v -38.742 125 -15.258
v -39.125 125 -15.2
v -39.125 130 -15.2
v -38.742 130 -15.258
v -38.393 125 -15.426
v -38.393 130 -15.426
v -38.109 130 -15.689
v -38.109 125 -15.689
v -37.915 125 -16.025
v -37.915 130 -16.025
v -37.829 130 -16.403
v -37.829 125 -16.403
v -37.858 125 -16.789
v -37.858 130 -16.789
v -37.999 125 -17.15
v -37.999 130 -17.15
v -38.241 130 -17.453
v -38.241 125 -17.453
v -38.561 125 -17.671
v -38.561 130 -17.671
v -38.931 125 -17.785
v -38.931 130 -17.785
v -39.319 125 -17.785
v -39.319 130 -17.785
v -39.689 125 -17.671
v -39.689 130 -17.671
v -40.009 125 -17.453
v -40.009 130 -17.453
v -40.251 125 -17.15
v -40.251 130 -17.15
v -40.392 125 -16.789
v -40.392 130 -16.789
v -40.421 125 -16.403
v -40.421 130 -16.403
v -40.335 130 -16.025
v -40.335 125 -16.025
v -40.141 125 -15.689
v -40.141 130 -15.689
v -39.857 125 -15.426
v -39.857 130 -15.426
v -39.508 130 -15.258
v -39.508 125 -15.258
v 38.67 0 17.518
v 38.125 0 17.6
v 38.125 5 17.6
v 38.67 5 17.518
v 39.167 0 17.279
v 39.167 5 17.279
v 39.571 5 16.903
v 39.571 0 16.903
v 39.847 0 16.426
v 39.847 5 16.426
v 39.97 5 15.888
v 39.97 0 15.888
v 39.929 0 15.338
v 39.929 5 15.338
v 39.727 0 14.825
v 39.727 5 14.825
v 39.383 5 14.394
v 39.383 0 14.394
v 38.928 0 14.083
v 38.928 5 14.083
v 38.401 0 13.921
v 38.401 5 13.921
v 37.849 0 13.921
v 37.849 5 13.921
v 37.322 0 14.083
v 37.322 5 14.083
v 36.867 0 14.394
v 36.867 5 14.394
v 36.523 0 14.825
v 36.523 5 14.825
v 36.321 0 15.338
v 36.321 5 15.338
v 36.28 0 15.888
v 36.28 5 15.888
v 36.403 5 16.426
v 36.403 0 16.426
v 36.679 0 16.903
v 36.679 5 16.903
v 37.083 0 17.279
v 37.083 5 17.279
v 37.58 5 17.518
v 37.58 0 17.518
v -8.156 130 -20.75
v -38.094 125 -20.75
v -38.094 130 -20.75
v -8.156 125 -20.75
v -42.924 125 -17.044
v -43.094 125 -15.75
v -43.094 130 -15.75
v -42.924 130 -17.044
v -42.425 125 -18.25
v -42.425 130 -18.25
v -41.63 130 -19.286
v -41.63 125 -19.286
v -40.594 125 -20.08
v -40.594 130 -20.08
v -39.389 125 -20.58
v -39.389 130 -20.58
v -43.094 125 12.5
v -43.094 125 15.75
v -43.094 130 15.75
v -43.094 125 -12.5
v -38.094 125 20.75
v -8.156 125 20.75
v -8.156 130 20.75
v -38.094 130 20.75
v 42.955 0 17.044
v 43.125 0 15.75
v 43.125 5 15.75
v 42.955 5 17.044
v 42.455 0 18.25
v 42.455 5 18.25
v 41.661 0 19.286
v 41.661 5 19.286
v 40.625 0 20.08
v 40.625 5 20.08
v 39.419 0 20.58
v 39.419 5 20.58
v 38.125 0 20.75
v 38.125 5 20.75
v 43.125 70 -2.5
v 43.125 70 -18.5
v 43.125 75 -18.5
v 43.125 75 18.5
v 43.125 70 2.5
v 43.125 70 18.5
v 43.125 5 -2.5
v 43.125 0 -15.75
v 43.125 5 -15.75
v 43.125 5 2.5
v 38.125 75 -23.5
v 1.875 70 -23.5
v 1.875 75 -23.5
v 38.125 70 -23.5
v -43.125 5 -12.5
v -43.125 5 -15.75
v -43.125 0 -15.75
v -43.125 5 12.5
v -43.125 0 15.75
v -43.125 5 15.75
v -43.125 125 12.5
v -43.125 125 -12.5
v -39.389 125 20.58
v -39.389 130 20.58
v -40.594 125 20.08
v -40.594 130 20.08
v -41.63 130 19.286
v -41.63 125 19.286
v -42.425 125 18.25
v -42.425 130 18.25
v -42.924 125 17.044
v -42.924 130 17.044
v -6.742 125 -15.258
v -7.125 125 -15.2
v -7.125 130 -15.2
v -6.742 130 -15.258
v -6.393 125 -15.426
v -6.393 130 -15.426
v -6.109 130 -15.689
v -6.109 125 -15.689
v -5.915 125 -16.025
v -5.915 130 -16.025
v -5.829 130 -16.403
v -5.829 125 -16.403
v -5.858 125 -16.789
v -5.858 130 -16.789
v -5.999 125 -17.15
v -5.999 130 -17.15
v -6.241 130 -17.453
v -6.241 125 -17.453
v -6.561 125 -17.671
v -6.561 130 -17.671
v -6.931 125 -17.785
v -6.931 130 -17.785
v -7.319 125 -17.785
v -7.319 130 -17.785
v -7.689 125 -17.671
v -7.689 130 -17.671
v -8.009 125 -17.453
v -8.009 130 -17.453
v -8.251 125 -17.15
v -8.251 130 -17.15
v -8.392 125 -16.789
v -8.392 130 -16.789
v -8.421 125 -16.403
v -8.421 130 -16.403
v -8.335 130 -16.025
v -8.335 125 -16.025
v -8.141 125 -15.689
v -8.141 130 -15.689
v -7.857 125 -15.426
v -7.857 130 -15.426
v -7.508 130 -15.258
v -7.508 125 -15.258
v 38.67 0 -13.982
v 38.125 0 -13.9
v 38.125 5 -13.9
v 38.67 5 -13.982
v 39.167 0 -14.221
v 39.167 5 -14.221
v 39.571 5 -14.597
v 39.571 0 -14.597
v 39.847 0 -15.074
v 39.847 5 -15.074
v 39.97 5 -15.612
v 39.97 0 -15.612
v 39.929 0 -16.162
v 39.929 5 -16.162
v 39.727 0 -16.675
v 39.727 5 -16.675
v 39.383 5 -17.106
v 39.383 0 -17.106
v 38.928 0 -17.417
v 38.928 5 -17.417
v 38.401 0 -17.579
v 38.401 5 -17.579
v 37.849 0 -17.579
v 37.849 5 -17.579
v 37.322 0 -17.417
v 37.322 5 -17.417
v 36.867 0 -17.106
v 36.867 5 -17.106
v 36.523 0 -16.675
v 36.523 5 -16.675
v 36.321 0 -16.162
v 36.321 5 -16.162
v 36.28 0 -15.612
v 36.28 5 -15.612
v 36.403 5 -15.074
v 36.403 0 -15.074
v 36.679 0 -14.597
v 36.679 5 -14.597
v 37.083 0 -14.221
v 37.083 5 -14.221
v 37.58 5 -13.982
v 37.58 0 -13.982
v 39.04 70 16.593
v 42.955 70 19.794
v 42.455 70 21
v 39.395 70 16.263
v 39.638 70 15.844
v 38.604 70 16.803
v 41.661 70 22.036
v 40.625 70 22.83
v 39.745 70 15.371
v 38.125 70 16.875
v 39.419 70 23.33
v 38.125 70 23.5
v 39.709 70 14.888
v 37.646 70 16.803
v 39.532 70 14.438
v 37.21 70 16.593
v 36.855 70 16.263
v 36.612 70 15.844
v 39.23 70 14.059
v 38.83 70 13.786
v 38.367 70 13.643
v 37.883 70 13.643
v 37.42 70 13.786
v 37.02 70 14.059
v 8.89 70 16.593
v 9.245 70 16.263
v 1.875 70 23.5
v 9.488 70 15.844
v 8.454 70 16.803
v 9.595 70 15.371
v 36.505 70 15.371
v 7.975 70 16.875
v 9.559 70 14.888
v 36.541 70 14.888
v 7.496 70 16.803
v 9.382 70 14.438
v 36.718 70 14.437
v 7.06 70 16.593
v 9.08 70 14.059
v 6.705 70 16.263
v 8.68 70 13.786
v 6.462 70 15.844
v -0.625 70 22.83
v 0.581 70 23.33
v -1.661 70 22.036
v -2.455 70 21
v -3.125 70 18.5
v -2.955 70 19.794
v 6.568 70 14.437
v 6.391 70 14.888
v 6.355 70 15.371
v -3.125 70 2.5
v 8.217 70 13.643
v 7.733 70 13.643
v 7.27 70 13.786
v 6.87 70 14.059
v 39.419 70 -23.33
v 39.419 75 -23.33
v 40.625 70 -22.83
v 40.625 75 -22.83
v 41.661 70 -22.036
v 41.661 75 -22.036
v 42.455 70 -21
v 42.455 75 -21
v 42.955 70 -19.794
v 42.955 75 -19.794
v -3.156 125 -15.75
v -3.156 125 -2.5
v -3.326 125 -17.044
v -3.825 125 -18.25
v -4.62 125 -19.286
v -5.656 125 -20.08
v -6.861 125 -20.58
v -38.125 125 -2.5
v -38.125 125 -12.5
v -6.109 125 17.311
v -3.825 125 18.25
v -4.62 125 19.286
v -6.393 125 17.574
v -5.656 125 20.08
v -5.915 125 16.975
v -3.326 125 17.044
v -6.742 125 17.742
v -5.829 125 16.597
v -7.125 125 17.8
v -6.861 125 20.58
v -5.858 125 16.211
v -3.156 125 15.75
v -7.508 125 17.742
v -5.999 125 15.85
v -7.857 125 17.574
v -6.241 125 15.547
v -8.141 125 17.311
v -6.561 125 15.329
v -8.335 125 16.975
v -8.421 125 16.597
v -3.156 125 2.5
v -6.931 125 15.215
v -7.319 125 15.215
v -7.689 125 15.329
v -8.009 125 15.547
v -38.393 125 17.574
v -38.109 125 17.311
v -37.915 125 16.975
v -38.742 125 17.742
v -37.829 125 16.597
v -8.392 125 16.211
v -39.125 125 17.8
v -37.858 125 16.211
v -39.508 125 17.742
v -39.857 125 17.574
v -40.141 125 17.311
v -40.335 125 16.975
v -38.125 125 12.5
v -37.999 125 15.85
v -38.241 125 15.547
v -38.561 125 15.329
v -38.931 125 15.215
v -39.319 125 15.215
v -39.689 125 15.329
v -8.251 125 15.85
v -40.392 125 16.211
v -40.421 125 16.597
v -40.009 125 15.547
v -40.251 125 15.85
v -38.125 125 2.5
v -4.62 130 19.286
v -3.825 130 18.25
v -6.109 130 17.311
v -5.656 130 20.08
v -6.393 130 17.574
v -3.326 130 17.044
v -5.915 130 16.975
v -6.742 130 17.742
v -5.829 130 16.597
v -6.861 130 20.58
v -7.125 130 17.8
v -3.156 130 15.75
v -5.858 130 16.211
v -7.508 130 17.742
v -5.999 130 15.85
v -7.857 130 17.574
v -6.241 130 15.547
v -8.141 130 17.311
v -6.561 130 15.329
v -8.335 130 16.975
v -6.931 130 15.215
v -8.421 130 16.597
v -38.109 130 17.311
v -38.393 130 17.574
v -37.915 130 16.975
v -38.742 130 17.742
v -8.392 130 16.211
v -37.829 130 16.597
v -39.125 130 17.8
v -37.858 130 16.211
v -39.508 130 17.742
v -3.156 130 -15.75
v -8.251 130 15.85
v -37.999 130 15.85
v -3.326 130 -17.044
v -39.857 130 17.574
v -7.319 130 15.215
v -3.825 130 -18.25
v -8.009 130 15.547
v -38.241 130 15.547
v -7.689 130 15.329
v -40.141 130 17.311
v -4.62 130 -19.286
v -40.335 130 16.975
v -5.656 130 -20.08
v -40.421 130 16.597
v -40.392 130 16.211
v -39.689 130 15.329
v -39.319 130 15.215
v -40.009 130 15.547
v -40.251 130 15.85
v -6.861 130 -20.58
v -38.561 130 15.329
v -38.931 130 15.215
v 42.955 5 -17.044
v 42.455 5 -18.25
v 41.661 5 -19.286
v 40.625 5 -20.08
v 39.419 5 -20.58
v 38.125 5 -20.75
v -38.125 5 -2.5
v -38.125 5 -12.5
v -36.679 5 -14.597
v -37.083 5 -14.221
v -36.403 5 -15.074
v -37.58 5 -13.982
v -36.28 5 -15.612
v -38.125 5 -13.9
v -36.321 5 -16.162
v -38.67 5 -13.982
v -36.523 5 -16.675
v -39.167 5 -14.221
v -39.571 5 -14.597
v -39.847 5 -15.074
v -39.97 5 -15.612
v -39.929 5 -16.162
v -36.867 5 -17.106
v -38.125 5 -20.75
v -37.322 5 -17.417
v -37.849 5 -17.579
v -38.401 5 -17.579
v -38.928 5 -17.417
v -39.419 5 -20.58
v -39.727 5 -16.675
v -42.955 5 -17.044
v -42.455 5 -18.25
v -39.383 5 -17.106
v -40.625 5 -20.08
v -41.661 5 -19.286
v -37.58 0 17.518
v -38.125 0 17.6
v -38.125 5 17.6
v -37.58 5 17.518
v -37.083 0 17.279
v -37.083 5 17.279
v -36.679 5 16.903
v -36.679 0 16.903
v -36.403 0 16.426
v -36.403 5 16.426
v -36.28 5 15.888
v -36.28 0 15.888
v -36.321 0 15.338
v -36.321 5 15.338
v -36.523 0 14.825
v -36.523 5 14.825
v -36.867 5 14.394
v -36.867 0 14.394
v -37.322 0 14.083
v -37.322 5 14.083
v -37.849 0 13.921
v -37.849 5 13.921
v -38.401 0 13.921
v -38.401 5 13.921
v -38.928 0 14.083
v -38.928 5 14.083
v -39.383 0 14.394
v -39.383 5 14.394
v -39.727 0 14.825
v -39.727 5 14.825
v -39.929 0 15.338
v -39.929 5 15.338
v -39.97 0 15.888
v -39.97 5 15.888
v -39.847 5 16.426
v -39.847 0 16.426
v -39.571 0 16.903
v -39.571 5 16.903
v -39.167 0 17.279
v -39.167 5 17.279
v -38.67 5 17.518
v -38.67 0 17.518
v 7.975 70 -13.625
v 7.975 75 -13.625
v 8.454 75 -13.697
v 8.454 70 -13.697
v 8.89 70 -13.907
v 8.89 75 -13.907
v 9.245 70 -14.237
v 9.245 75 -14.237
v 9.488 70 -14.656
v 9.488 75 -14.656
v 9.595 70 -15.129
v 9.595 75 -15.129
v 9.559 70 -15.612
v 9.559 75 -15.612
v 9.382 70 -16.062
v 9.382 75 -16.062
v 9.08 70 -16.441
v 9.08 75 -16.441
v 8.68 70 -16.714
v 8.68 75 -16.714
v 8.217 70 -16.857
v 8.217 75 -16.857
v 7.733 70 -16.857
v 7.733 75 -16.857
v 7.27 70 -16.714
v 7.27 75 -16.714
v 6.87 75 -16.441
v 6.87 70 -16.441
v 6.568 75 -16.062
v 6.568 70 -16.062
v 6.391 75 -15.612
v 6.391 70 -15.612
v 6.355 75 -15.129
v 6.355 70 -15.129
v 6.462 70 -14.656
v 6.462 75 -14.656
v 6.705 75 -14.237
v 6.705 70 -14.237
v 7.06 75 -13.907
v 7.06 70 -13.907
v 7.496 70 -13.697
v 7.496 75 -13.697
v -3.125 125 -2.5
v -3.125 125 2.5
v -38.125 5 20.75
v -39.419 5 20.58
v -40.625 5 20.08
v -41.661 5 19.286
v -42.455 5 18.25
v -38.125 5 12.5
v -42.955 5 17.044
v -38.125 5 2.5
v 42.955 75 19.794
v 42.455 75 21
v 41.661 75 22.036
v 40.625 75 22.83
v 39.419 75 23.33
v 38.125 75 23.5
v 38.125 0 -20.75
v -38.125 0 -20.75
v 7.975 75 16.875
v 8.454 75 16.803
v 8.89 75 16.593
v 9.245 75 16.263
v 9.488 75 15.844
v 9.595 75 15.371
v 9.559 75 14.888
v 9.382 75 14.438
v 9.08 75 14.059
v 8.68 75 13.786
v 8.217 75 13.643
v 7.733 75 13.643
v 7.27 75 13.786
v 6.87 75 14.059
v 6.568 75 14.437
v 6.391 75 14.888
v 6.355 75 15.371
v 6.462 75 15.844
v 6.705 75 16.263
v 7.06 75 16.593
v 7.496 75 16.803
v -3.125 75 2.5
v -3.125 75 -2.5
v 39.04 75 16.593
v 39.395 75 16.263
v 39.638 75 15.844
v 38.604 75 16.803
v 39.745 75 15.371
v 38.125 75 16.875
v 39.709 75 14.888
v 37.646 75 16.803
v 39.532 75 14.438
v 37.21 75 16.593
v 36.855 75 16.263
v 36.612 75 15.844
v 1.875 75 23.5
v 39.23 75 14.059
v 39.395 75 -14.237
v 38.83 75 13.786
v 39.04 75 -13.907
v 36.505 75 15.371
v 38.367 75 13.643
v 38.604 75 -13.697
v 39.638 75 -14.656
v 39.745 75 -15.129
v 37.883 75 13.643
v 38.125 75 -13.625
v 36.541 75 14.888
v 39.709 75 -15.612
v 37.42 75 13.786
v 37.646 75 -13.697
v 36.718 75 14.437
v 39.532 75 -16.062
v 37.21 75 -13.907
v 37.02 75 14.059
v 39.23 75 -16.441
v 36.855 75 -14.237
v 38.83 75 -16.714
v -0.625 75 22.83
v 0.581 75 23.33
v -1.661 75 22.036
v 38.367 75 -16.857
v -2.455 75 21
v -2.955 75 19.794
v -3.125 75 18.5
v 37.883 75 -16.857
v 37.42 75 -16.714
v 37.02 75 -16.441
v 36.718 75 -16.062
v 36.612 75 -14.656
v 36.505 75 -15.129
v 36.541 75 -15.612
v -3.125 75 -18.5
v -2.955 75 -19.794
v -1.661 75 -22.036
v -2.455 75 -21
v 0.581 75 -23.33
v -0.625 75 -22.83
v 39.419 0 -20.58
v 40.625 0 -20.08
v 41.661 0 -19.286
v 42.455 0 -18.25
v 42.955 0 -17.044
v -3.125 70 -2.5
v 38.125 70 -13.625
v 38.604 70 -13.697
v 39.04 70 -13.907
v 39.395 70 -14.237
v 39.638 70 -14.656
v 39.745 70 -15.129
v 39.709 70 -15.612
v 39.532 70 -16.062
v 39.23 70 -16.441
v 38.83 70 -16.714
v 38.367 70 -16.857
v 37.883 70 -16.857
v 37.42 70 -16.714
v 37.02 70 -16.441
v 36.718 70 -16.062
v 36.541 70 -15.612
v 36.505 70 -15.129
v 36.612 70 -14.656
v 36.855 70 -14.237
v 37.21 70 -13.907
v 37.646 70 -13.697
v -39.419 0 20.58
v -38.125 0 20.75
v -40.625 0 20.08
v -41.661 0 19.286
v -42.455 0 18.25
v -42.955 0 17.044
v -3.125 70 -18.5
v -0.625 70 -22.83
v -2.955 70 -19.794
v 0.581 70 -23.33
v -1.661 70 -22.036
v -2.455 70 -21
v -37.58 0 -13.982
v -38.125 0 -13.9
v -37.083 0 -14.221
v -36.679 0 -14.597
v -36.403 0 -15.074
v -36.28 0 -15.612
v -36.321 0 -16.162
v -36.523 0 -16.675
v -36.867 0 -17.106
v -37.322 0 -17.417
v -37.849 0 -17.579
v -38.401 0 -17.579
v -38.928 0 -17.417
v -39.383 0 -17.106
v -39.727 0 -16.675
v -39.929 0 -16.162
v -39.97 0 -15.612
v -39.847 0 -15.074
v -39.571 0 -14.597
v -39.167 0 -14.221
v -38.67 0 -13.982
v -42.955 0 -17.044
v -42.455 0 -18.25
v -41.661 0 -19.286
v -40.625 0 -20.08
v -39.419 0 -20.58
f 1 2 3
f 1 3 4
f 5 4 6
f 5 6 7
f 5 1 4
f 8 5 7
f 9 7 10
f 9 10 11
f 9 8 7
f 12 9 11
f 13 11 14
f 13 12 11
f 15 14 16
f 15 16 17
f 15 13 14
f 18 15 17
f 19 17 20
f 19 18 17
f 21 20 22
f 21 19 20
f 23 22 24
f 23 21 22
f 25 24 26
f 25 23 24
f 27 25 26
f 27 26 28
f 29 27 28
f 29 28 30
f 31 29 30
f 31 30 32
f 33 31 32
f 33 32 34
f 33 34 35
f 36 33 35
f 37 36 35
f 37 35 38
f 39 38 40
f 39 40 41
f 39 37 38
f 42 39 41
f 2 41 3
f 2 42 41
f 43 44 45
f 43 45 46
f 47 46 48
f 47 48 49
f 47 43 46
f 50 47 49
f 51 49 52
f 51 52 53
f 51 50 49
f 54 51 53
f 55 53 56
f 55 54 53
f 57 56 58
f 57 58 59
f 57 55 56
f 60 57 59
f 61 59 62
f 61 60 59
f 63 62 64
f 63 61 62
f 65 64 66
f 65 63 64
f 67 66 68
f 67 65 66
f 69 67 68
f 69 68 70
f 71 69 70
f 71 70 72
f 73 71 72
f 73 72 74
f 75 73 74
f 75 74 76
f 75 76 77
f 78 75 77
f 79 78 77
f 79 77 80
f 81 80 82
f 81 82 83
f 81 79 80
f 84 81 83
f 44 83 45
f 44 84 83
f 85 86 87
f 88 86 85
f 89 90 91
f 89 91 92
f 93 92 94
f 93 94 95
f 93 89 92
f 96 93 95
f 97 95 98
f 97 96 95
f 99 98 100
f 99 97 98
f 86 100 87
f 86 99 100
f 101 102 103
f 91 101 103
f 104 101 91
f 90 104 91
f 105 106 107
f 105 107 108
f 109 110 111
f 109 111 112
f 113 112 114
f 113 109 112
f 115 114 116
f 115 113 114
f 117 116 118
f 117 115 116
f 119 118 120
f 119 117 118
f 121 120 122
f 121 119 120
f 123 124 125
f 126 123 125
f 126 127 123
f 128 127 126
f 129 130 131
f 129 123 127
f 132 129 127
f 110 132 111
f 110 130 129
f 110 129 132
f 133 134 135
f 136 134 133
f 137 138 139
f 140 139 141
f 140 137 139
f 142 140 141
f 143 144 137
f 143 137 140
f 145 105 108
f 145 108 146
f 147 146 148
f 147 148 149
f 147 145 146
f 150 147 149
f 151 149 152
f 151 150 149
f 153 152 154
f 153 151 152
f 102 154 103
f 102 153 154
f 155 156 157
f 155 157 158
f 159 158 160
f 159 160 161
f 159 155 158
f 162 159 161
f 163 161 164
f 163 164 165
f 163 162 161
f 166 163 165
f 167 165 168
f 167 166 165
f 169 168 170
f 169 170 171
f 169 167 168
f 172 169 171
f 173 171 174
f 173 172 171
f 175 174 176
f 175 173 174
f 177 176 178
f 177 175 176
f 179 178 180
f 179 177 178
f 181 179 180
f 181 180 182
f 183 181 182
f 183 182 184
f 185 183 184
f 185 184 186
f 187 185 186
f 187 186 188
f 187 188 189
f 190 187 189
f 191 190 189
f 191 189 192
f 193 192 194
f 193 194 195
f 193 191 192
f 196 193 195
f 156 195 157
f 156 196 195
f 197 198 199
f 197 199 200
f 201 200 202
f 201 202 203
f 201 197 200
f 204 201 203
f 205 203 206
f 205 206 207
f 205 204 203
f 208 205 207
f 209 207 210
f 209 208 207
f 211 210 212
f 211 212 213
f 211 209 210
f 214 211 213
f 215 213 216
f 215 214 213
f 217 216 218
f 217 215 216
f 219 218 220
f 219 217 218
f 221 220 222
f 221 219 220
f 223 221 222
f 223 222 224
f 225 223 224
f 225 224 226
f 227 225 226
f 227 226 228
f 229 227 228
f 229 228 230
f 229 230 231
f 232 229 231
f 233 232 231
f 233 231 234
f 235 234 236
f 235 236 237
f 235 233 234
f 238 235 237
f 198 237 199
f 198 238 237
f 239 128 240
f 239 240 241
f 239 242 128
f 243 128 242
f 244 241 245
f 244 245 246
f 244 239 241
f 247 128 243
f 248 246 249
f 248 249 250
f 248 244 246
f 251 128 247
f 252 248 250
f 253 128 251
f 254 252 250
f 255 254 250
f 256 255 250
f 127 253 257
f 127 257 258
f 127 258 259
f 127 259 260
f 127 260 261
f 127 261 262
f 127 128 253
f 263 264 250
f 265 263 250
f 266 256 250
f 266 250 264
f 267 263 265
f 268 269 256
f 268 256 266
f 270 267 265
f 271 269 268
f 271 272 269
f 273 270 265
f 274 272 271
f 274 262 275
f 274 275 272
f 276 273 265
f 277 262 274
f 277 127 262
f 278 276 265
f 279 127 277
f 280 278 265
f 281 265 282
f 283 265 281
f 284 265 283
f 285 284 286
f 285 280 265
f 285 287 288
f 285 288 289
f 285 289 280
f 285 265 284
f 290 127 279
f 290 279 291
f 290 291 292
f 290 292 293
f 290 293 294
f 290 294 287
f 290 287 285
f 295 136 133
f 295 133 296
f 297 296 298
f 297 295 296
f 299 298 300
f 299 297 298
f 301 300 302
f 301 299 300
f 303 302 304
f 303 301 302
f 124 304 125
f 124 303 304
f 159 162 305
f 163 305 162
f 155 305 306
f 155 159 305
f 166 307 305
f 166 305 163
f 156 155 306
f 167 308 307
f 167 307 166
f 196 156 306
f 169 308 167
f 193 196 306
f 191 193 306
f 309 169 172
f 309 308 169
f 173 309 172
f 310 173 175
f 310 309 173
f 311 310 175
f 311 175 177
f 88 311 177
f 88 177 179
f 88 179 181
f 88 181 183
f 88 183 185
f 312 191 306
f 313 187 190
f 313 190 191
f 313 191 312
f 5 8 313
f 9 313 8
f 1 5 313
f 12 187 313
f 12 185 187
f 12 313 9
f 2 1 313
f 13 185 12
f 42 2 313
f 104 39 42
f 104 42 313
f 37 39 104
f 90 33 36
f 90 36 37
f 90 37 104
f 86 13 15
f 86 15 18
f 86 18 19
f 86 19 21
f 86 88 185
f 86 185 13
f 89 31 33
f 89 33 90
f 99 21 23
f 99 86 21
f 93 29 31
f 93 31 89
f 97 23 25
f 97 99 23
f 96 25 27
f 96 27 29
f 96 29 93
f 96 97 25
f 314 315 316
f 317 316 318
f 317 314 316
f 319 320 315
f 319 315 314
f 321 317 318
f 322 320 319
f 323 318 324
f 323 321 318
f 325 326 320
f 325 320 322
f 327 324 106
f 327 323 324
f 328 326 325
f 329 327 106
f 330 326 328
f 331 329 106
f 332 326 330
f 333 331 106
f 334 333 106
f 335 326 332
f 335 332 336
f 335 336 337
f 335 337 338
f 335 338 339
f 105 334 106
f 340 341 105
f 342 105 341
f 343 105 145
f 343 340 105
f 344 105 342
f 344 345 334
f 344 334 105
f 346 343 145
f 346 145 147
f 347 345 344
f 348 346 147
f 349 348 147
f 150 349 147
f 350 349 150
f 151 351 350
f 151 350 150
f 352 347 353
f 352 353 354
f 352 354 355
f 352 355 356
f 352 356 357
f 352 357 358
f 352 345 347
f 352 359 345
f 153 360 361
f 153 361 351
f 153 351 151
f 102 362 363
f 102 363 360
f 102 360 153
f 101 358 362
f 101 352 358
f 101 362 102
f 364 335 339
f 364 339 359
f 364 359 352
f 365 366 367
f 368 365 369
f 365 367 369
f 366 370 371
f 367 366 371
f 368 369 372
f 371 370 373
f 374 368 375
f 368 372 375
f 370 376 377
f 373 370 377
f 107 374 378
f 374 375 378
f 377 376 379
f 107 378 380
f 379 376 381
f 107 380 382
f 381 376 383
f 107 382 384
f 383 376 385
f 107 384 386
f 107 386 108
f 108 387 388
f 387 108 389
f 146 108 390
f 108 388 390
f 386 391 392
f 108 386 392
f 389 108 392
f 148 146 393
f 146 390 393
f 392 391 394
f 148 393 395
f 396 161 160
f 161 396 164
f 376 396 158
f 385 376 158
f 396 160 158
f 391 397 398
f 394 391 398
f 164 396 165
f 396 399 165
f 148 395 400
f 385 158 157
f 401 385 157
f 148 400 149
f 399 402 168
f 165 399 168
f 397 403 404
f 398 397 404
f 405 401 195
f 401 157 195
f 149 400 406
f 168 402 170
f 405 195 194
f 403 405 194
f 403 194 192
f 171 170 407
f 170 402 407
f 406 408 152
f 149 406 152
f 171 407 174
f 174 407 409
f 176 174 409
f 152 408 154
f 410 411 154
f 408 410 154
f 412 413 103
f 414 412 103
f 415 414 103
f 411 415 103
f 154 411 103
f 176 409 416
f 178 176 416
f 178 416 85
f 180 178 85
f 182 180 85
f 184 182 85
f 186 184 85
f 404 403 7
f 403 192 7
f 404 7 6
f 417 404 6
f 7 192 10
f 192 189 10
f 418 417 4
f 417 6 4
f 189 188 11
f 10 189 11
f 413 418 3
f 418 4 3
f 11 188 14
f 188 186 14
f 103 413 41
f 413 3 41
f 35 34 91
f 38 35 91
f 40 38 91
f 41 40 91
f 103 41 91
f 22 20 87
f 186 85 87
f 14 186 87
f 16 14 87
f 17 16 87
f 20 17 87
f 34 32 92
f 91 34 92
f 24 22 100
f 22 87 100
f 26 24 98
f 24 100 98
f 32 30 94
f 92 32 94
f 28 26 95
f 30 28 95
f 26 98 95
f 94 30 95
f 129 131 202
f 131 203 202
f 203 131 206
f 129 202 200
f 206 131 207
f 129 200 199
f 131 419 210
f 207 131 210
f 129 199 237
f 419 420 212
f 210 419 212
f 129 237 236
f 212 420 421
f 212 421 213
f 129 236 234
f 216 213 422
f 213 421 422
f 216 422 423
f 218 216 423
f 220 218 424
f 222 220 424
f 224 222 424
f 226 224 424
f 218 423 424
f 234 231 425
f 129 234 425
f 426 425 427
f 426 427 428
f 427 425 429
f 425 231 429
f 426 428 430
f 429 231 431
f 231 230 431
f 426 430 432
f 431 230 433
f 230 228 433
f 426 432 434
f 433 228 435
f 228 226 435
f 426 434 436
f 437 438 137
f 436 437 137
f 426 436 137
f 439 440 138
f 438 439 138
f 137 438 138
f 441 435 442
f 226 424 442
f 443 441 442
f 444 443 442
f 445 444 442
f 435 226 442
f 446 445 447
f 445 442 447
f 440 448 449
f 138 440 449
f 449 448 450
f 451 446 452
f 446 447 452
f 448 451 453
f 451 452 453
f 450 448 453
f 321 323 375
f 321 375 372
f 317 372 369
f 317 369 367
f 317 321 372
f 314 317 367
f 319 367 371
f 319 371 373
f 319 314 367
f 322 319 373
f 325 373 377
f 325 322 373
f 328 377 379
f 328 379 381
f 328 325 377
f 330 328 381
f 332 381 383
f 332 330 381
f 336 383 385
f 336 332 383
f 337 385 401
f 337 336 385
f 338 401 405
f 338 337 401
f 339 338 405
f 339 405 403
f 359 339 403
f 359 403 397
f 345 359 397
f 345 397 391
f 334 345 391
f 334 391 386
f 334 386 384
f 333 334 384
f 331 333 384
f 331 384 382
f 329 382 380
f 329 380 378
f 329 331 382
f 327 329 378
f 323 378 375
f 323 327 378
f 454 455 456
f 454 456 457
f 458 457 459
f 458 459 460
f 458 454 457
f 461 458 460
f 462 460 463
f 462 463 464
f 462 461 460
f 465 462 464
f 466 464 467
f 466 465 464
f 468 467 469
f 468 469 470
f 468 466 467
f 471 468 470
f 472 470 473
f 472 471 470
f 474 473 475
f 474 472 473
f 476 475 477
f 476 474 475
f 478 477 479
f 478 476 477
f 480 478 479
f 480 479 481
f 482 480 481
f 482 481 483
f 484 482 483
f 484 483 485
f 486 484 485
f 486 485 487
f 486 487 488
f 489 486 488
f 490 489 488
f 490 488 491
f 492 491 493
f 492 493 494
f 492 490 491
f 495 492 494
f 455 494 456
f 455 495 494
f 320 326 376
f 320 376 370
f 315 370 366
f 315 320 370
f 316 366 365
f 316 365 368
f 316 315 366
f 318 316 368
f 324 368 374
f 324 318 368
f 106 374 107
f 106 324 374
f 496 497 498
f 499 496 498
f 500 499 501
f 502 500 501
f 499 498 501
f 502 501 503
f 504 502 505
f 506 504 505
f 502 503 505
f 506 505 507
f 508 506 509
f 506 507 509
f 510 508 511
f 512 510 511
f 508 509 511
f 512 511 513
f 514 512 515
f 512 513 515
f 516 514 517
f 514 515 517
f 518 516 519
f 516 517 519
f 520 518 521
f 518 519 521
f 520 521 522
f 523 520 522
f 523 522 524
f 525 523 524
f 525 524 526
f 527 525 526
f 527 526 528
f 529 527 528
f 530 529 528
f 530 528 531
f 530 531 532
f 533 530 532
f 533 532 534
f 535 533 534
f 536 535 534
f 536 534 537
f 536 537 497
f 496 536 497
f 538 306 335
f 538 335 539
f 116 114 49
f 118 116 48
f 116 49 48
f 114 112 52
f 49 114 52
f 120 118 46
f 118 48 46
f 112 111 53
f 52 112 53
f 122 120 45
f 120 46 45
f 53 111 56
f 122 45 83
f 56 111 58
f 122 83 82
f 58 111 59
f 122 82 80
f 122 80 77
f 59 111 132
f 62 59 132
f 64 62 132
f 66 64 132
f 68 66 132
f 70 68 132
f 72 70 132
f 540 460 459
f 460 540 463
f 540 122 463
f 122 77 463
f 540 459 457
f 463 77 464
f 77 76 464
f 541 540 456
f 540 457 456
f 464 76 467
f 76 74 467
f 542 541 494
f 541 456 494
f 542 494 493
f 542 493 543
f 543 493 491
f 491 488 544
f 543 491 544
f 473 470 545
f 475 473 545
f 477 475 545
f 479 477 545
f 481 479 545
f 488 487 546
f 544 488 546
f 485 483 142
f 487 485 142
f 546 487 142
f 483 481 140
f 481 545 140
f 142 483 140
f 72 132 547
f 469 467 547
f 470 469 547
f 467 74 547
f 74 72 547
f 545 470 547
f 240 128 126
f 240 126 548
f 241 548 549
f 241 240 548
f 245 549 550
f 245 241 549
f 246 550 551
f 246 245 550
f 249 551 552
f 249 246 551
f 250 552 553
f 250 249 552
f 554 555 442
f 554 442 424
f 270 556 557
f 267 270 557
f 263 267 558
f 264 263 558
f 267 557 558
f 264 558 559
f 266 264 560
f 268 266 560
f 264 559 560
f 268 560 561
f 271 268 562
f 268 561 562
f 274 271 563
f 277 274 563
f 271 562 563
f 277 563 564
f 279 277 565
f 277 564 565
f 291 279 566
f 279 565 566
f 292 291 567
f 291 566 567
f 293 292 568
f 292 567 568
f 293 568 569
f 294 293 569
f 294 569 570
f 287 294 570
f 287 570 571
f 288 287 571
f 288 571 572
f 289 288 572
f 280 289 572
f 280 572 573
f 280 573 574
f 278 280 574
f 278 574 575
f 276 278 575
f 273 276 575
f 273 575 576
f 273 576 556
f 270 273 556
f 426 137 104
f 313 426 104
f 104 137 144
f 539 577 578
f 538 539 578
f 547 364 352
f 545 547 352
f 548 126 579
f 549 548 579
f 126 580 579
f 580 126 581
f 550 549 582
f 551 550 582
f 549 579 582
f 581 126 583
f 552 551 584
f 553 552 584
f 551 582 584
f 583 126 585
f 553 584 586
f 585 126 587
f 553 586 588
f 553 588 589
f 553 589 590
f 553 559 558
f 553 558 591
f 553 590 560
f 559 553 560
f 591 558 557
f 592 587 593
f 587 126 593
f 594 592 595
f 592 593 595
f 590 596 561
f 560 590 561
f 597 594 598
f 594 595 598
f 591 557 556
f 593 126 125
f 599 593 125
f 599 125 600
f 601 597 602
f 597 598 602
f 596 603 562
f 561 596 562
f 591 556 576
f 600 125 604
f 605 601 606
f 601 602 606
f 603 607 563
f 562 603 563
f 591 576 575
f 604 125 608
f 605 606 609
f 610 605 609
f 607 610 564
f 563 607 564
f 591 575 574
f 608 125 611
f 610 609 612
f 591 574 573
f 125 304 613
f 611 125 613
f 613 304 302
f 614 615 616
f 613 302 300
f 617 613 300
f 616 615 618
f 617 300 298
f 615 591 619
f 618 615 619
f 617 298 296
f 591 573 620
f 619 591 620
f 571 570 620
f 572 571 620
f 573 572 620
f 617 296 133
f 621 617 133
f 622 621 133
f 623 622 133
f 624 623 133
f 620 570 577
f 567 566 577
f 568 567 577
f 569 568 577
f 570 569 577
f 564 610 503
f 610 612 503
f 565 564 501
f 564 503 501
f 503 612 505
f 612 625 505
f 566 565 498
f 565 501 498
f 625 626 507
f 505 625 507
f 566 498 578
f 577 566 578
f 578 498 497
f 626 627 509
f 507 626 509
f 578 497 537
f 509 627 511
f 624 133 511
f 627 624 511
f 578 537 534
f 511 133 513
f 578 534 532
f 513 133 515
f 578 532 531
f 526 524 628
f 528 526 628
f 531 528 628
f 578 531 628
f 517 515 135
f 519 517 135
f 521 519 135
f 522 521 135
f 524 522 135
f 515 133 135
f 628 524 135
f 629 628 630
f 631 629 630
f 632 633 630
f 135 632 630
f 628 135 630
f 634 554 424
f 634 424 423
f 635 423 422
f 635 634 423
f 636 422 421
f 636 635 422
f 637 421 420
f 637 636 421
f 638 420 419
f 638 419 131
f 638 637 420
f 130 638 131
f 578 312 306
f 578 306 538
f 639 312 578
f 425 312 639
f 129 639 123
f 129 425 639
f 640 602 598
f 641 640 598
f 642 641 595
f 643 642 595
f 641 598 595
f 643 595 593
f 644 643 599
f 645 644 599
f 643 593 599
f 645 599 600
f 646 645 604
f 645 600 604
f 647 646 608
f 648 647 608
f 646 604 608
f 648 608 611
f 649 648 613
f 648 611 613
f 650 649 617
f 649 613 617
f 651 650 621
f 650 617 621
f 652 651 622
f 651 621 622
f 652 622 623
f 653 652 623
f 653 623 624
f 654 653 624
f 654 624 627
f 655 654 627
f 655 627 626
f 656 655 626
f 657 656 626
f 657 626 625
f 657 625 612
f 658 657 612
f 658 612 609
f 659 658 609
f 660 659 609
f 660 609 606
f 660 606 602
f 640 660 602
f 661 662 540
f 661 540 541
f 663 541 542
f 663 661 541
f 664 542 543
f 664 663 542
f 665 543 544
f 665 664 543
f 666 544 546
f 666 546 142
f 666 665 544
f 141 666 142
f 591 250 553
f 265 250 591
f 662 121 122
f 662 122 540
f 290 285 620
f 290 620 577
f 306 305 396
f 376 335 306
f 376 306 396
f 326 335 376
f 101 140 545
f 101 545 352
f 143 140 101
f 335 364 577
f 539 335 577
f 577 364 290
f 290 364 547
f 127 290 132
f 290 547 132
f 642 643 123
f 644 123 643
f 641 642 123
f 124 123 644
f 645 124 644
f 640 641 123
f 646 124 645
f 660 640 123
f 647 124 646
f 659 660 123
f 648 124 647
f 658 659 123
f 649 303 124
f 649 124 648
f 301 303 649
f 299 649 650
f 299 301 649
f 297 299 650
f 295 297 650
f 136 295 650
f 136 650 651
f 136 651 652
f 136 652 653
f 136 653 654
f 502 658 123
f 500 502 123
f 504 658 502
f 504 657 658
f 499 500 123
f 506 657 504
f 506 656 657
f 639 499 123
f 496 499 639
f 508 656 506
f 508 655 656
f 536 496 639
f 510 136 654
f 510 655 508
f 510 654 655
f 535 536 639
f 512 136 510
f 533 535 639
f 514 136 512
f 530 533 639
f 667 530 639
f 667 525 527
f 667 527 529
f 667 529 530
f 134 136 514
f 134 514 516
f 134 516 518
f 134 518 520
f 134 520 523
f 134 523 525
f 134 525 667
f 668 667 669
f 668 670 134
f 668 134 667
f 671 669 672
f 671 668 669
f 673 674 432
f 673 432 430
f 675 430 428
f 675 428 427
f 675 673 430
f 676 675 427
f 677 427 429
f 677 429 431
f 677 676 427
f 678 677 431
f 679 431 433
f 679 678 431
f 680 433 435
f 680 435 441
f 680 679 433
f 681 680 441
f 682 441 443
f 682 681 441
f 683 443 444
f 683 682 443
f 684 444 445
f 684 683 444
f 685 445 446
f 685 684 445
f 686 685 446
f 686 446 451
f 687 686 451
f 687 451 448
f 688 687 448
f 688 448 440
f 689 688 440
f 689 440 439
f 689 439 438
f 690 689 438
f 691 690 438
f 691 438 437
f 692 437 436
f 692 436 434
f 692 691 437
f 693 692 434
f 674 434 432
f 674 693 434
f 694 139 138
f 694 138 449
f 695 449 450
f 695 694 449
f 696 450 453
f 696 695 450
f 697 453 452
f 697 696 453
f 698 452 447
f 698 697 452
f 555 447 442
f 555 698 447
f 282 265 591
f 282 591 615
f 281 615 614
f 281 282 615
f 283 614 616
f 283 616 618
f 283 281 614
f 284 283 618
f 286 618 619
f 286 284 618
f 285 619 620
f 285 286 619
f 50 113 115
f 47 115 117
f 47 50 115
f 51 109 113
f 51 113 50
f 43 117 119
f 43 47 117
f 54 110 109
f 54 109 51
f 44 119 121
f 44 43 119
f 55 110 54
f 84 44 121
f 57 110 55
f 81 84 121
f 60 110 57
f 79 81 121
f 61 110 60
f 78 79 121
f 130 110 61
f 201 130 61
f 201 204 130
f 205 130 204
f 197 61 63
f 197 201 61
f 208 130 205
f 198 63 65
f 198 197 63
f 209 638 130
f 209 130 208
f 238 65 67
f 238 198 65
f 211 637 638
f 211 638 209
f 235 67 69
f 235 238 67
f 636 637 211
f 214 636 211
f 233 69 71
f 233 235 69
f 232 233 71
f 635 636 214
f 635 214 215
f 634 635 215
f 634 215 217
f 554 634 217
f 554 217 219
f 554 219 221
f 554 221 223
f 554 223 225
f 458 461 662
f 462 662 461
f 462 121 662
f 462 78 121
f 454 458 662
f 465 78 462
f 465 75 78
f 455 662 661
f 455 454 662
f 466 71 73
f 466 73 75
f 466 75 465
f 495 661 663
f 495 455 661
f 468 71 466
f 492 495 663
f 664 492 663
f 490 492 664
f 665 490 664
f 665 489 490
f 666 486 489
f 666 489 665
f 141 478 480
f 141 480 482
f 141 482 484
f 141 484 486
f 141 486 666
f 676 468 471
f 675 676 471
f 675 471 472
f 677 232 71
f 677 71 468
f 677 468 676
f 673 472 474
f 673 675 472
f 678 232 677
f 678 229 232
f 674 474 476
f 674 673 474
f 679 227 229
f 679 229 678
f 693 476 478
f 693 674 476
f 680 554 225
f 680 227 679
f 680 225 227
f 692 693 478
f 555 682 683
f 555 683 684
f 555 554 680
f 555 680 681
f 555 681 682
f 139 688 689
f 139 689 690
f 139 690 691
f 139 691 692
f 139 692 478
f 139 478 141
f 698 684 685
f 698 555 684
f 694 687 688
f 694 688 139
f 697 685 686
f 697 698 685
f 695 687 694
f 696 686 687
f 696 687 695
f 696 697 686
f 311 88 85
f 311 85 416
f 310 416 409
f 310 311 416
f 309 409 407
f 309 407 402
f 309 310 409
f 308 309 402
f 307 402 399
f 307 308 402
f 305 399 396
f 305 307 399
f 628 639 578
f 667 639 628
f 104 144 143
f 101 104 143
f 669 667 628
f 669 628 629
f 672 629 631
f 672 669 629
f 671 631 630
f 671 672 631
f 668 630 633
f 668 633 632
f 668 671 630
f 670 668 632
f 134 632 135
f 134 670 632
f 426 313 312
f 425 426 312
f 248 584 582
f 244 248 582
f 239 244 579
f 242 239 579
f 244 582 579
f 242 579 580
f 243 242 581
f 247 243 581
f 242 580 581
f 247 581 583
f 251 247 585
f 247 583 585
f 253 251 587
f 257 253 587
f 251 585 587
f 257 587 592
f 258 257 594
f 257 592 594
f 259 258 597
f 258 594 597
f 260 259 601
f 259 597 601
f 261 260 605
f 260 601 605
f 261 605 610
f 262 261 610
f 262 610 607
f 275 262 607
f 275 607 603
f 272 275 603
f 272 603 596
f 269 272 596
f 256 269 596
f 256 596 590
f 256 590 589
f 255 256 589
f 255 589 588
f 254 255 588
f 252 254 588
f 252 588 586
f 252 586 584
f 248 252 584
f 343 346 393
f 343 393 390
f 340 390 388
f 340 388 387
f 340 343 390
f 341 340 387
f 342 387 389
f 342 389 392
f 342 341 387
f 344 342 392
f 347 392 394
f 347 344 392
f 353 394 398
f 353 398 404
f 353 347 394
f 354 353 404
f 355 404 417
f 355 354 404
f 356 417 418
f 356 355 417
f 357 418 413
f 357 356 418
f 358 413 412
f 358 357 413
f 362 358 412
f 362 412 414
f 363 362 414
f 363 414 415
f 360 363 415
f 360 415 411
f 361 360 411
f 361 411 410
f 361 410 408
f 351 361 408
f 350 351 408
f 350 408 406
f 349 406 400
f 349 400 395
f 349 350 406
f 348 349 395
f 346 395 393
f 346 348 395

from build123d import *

# Parameters (mm, degrees)
SKT_BASE_W_MOUNTING_HOLES_R           = 1.85
EXT_BASE_PLATE_W_MOUNTING_HOLES_DEPTH = 5
SKT_UPWARD_RIDGE_W                    = 86.25
SKT_UPWARD_RIDGE_H                    = 5
EXT_UPWARD_FLANGE_DEPTH               = 65
EXT_PIX_PLATFORM_DEPTH                = 5
PIX_MOUNT_HOLES_REACH                 = 91.649
SKETCH7_R                             = 1.625
SKETCH8_W                             = 40
SKETCH8_H                             = 5
GPS_FLANGE_DEPTH                      = 55
SKETCH9_R                             = 1.3
GPS_PLATFORM_DEPTH                    = 5
SKETCH10_W                            = 10
SKETCH10_H                            = 120
BRACING_DEPTH                         = 5


with BuildPart() as part:
    # Skt - Base w mounting holes → Ext - Base Plate w Mounting Holes (new body)
    with BuildSketch(Plane(origin=(0, 0, 0), x_dir=(1, 0, 0), z_dir=(0, 1, 0))):
        with BuildLine():
            Line((-38.125, 20.75), (38.125, 20.75))
            ThreePointArc((38.125, 20.75), (41.660533906, 19.285533906), (43.125, 15.75))
            Line((43.125, 15.75), (43.125, -15.75))
            ThreePointArc((43.125, -15.75), (41.660533906, -19.285533906), (38.125, -20.75))
            Line((38.125, -20.75), (-38.125, -20.75))
            ThreePointArc((-38.125, -20.75), (-41.660533906, -19.285533906), (-43.125, -15.75))
            Line((-43.125, -15.75), (-43.125, 15.75))
            ThreePointArc((-43.125, 15.75), (-41.660533906, 19.285533906), (-38.125, 20.75))
        make_face()
        with Locations(Location((-38.125, 15.75, 0), (0, 0, 270))):
            Circle(SKT_BASE_W_MOUNTING_HOLES_R, mode=Mode.SUBTRACT)
        with Locations(Location((38.125, 15.75, 0), (0, 0, 270))):
            Circle(SKT_BASE_W_MOUNTING_HOLES_R, mode=Mode.SUBTRACT)
        with Locations(Location((38.125, -15.75, 0), (0, 0, 270))):
            Circle(SKT_BASE_W_MOUNTING_HOLES_R, mode=Mode.SUBTRACT)
        with Locations(Location((-38.125, -15.75, 0), (0, 0, 270))):
            Circle(SKT_BASE_W_MOUNTING_HOLES_R, mode=Mode.SUBTRACT)
    extrude(amount=EXT_BASE_PLATE_W_MOUNTING_HOLES_DEPTH)

    # Skt - Upward Ridge → Ext - Upward Flange (add)
    with BuildSketch(Plane(origin=(0, 5, 0), x_dir=(1, 0, 0), z_dir=(0, 1, 0))):
        Rectangle(SKT_UPWARD_RIDGE_W, SKT_UPWARD_RIDGE_H)
    extrude(amount=EXT_UPWARD_FLANGE_DEPTH)

    # Skt - GPS Nest → Ext - PIX Platform (add)
    with BuildSketch(Plane(origin=(0, 70, 0), x_dir=(1, 0, 0), z_dir=(0, 1, 0))):
        with BuildLine():
            Line((1.875, 23.5), (38.125, 23.5))
            ThreePointArc((38.125, 23.5), (41.660533906, 22.035533906), (43.125, 18.5))
            Line((43.125, 18.5), (43.125, -18.5))
            ThreePointArc((43.125, -18.5), (41.660533906, -22.035533906), (38.125, -23.5))
            Line((38.125, -23.5), (1.875, -23.5))
            ThreePointArc((1.875, -23.5), (-1.660533906, -22.035533906), (-3.125, -18.5))
            Line((-3.125, -18.5), (-3.125, 18.5))
            ThreePointArc((-3.125, 18.5), (-1.660533906, 22.035533906), (1.875, 23.5))
        make_face()
    extrude(amount=EXT_PIX_PLATFORM_DEPTH)

    # Sketch7 → Pix Mount Holes (cut, up to next)
    with BuildSketch(Plane(origin=(0, 75, 0), x_dir=(1, 0, 0), z_dir=(0, 1, 0)), mode=Mode.PRIVATE) as pix_mount_holes_sk1:
        with Locations(Location((7.975, 15.25, 0), (0, 0, 270))):
            Circle(SKETCH7_R)
    pix_mount_holes_tool1 = extrude(pix_mount_holes_sk1.sketch, amount=-PIX_MOUNT_HOLES_REACH, mode=Mode.PRIVATE) & part.part
    # Sketch7 → Pix Mount Holes (cut, up to next)
    with BuildSketch(Plane(origin=(0, 75, 0), x_dir=(1, 0, 0), z_dir=(0, 1, 0)), mode=Mode.PRIVATE) as pix_mount_holes_sk2:
        with Locations(Location((38.125, 15.25, 0), (0, 0, 270))):
            Circle(SKETCH7_R)
    pix_mount_holes_tool2 = extrude(pix_mount_holes_sk2.sketch, amount=-PIX_MOUNT_HOLES_REACH, mode=Mode.PRIVATE) & part.part
    # Sketch7 → Pix Mount Holes (cut, up to next)
    with BuildSketch(Plane(origin=(0, 75, 0), x_dir=(1, 0, 0), z_dir=(0, 1, 0)), mode=Mode.PRIVATE) as pix_mount_holes_sk3:
        with Locations(Location((38.125, -15.25, 0), (0, 0, 270))):
            Circle(SKETCH7_R)
    pix_mount_holes_tool3 = extrude(pix_mount_holes_sk3.sketch, amount=-PIX_MOUNT_HOLES_REACH, mode=Mode.PRIVATE) & part.part
    # Sketch7 → Pix Mount Holes (cut, up to next)
    with BuildSketch(Plane(origin=(0, 75, 0), x_dir=(1, 0, 0), z_dir=(0, 1, 0)), mode=Mode.PRIVATE) as pix_mount_holes_sk4:
        with Locations(Location((7.975, -15.25, 0), (0, 0, 270))):
            Circle(SKETCH7_R)
    pix_mount_holes_tool4 = extrude(pix_mount_holes_sk4.sketch, amount=-PIX_MOUNT_HOLES_REACH, mode=Mode.PRIVATE) & part.part
    add(pix_mount_holes_tool1.solids().sort_by_distance((7.975, 75, -15.25))[0], mode=Mode.SUBTRACT)
    add(pix_mount_holes_tool2.solids().sort_by_distance((38.125, 75, -15.25))[0], mode=Mode.SUBTRACT)
    add(pix_mount_holes_tool3.solids().sort_by_distance((38.125, 75, 15.25))[0], mode=Mode.SUBTRACT)
    add(pix_mount_holes_tool4.solids().sort_by_distance((7.975, 75, 15.25))[0], mode=Mode.SUBTRACT)

    # Sketch8 → GPS Flange (add)
    with BuildSketch(Plane(origin=(0, 70, 0), x_dir=(1, 0, 0), z_dir=(0, 1, 0))):
        with Locations((-23.125, 0)):
            Rectangle(SKETCH8_W, SKETCH8_H)
    extrude(amount=GPS_FLANGE_DEPTH)

    # Sketch9 → GPS Platform (add)
    with BuildSketch(Plane(origin=(0, 125, 0), x_dir=(1, 0, 0), z_dir=(0, 1, 0))):
        with BuildLine():
            Line((-38.094429072, 20.75), (-8.155570928, 20.75))
            ThreePointArc((-8.155570928, 20.75), (-4.620037022, 19.285533906), (-3.155570928, 15.75))
            Line((-3.155570928, 15.75), (-3.155570928, -15.75))
            ThreePointArc((-3.155570928, -15.75), (-4.620037022, -19.285533906), (-8.155570928, -20.75))
            Line((-8.155570928, -20.75), (-38.094429072, -20.75))
            ThreePointArc((-38.094429072, -20.75), (-41.629962978, -19.285533906), (-43.094429072, -15.75))
            Line((-43.094429072, -15.75), (-43.094429072, 15.75))
            ThreePointArc((-43.094429072, 15.75), (-41.629962978, 19.285533906), (-38.094429072, 20.75))
        make_face()
        with Locations(Location((-39.125, 16.5, 0), (0, 0, 270))):
            Circle(SKETCH9_R, mode=Mode.SUBTRACT)
        with Locations(Location((-7.125, 16.5, 0), (0, 0, 270))):
            Circle(SKETCH9_R, mode=Mode.SUBTRACT)
        with Locations(Location((-7.125, -16.5, 0), (0, 0, 270))):
            Circle(SKETCH9_R, mode=Mode.SUBTRACT)
        with Locations(Location((-39.125, -16.5, 0), (0, 0, 270))):
            Circle(SKETCH9_R, mode=Mode.SUBTRACT)
    extrude(amount=GPS_PLATFORM_DEPTH)

    # Sketch10 → Bracing (add)
    with BuildSketch(Plane.ZY.offset(43.125)):
        with Locations((-7.5, 65)):
            Rectangle(SKETCH10_W, SKETCH10_H)
        with Locations((7.5, 65)):
            Rectangle(SKETCH10_W, SKETCH10_H)
    extrude(amount=-BRACING_DEPTH)


solid = part.part
